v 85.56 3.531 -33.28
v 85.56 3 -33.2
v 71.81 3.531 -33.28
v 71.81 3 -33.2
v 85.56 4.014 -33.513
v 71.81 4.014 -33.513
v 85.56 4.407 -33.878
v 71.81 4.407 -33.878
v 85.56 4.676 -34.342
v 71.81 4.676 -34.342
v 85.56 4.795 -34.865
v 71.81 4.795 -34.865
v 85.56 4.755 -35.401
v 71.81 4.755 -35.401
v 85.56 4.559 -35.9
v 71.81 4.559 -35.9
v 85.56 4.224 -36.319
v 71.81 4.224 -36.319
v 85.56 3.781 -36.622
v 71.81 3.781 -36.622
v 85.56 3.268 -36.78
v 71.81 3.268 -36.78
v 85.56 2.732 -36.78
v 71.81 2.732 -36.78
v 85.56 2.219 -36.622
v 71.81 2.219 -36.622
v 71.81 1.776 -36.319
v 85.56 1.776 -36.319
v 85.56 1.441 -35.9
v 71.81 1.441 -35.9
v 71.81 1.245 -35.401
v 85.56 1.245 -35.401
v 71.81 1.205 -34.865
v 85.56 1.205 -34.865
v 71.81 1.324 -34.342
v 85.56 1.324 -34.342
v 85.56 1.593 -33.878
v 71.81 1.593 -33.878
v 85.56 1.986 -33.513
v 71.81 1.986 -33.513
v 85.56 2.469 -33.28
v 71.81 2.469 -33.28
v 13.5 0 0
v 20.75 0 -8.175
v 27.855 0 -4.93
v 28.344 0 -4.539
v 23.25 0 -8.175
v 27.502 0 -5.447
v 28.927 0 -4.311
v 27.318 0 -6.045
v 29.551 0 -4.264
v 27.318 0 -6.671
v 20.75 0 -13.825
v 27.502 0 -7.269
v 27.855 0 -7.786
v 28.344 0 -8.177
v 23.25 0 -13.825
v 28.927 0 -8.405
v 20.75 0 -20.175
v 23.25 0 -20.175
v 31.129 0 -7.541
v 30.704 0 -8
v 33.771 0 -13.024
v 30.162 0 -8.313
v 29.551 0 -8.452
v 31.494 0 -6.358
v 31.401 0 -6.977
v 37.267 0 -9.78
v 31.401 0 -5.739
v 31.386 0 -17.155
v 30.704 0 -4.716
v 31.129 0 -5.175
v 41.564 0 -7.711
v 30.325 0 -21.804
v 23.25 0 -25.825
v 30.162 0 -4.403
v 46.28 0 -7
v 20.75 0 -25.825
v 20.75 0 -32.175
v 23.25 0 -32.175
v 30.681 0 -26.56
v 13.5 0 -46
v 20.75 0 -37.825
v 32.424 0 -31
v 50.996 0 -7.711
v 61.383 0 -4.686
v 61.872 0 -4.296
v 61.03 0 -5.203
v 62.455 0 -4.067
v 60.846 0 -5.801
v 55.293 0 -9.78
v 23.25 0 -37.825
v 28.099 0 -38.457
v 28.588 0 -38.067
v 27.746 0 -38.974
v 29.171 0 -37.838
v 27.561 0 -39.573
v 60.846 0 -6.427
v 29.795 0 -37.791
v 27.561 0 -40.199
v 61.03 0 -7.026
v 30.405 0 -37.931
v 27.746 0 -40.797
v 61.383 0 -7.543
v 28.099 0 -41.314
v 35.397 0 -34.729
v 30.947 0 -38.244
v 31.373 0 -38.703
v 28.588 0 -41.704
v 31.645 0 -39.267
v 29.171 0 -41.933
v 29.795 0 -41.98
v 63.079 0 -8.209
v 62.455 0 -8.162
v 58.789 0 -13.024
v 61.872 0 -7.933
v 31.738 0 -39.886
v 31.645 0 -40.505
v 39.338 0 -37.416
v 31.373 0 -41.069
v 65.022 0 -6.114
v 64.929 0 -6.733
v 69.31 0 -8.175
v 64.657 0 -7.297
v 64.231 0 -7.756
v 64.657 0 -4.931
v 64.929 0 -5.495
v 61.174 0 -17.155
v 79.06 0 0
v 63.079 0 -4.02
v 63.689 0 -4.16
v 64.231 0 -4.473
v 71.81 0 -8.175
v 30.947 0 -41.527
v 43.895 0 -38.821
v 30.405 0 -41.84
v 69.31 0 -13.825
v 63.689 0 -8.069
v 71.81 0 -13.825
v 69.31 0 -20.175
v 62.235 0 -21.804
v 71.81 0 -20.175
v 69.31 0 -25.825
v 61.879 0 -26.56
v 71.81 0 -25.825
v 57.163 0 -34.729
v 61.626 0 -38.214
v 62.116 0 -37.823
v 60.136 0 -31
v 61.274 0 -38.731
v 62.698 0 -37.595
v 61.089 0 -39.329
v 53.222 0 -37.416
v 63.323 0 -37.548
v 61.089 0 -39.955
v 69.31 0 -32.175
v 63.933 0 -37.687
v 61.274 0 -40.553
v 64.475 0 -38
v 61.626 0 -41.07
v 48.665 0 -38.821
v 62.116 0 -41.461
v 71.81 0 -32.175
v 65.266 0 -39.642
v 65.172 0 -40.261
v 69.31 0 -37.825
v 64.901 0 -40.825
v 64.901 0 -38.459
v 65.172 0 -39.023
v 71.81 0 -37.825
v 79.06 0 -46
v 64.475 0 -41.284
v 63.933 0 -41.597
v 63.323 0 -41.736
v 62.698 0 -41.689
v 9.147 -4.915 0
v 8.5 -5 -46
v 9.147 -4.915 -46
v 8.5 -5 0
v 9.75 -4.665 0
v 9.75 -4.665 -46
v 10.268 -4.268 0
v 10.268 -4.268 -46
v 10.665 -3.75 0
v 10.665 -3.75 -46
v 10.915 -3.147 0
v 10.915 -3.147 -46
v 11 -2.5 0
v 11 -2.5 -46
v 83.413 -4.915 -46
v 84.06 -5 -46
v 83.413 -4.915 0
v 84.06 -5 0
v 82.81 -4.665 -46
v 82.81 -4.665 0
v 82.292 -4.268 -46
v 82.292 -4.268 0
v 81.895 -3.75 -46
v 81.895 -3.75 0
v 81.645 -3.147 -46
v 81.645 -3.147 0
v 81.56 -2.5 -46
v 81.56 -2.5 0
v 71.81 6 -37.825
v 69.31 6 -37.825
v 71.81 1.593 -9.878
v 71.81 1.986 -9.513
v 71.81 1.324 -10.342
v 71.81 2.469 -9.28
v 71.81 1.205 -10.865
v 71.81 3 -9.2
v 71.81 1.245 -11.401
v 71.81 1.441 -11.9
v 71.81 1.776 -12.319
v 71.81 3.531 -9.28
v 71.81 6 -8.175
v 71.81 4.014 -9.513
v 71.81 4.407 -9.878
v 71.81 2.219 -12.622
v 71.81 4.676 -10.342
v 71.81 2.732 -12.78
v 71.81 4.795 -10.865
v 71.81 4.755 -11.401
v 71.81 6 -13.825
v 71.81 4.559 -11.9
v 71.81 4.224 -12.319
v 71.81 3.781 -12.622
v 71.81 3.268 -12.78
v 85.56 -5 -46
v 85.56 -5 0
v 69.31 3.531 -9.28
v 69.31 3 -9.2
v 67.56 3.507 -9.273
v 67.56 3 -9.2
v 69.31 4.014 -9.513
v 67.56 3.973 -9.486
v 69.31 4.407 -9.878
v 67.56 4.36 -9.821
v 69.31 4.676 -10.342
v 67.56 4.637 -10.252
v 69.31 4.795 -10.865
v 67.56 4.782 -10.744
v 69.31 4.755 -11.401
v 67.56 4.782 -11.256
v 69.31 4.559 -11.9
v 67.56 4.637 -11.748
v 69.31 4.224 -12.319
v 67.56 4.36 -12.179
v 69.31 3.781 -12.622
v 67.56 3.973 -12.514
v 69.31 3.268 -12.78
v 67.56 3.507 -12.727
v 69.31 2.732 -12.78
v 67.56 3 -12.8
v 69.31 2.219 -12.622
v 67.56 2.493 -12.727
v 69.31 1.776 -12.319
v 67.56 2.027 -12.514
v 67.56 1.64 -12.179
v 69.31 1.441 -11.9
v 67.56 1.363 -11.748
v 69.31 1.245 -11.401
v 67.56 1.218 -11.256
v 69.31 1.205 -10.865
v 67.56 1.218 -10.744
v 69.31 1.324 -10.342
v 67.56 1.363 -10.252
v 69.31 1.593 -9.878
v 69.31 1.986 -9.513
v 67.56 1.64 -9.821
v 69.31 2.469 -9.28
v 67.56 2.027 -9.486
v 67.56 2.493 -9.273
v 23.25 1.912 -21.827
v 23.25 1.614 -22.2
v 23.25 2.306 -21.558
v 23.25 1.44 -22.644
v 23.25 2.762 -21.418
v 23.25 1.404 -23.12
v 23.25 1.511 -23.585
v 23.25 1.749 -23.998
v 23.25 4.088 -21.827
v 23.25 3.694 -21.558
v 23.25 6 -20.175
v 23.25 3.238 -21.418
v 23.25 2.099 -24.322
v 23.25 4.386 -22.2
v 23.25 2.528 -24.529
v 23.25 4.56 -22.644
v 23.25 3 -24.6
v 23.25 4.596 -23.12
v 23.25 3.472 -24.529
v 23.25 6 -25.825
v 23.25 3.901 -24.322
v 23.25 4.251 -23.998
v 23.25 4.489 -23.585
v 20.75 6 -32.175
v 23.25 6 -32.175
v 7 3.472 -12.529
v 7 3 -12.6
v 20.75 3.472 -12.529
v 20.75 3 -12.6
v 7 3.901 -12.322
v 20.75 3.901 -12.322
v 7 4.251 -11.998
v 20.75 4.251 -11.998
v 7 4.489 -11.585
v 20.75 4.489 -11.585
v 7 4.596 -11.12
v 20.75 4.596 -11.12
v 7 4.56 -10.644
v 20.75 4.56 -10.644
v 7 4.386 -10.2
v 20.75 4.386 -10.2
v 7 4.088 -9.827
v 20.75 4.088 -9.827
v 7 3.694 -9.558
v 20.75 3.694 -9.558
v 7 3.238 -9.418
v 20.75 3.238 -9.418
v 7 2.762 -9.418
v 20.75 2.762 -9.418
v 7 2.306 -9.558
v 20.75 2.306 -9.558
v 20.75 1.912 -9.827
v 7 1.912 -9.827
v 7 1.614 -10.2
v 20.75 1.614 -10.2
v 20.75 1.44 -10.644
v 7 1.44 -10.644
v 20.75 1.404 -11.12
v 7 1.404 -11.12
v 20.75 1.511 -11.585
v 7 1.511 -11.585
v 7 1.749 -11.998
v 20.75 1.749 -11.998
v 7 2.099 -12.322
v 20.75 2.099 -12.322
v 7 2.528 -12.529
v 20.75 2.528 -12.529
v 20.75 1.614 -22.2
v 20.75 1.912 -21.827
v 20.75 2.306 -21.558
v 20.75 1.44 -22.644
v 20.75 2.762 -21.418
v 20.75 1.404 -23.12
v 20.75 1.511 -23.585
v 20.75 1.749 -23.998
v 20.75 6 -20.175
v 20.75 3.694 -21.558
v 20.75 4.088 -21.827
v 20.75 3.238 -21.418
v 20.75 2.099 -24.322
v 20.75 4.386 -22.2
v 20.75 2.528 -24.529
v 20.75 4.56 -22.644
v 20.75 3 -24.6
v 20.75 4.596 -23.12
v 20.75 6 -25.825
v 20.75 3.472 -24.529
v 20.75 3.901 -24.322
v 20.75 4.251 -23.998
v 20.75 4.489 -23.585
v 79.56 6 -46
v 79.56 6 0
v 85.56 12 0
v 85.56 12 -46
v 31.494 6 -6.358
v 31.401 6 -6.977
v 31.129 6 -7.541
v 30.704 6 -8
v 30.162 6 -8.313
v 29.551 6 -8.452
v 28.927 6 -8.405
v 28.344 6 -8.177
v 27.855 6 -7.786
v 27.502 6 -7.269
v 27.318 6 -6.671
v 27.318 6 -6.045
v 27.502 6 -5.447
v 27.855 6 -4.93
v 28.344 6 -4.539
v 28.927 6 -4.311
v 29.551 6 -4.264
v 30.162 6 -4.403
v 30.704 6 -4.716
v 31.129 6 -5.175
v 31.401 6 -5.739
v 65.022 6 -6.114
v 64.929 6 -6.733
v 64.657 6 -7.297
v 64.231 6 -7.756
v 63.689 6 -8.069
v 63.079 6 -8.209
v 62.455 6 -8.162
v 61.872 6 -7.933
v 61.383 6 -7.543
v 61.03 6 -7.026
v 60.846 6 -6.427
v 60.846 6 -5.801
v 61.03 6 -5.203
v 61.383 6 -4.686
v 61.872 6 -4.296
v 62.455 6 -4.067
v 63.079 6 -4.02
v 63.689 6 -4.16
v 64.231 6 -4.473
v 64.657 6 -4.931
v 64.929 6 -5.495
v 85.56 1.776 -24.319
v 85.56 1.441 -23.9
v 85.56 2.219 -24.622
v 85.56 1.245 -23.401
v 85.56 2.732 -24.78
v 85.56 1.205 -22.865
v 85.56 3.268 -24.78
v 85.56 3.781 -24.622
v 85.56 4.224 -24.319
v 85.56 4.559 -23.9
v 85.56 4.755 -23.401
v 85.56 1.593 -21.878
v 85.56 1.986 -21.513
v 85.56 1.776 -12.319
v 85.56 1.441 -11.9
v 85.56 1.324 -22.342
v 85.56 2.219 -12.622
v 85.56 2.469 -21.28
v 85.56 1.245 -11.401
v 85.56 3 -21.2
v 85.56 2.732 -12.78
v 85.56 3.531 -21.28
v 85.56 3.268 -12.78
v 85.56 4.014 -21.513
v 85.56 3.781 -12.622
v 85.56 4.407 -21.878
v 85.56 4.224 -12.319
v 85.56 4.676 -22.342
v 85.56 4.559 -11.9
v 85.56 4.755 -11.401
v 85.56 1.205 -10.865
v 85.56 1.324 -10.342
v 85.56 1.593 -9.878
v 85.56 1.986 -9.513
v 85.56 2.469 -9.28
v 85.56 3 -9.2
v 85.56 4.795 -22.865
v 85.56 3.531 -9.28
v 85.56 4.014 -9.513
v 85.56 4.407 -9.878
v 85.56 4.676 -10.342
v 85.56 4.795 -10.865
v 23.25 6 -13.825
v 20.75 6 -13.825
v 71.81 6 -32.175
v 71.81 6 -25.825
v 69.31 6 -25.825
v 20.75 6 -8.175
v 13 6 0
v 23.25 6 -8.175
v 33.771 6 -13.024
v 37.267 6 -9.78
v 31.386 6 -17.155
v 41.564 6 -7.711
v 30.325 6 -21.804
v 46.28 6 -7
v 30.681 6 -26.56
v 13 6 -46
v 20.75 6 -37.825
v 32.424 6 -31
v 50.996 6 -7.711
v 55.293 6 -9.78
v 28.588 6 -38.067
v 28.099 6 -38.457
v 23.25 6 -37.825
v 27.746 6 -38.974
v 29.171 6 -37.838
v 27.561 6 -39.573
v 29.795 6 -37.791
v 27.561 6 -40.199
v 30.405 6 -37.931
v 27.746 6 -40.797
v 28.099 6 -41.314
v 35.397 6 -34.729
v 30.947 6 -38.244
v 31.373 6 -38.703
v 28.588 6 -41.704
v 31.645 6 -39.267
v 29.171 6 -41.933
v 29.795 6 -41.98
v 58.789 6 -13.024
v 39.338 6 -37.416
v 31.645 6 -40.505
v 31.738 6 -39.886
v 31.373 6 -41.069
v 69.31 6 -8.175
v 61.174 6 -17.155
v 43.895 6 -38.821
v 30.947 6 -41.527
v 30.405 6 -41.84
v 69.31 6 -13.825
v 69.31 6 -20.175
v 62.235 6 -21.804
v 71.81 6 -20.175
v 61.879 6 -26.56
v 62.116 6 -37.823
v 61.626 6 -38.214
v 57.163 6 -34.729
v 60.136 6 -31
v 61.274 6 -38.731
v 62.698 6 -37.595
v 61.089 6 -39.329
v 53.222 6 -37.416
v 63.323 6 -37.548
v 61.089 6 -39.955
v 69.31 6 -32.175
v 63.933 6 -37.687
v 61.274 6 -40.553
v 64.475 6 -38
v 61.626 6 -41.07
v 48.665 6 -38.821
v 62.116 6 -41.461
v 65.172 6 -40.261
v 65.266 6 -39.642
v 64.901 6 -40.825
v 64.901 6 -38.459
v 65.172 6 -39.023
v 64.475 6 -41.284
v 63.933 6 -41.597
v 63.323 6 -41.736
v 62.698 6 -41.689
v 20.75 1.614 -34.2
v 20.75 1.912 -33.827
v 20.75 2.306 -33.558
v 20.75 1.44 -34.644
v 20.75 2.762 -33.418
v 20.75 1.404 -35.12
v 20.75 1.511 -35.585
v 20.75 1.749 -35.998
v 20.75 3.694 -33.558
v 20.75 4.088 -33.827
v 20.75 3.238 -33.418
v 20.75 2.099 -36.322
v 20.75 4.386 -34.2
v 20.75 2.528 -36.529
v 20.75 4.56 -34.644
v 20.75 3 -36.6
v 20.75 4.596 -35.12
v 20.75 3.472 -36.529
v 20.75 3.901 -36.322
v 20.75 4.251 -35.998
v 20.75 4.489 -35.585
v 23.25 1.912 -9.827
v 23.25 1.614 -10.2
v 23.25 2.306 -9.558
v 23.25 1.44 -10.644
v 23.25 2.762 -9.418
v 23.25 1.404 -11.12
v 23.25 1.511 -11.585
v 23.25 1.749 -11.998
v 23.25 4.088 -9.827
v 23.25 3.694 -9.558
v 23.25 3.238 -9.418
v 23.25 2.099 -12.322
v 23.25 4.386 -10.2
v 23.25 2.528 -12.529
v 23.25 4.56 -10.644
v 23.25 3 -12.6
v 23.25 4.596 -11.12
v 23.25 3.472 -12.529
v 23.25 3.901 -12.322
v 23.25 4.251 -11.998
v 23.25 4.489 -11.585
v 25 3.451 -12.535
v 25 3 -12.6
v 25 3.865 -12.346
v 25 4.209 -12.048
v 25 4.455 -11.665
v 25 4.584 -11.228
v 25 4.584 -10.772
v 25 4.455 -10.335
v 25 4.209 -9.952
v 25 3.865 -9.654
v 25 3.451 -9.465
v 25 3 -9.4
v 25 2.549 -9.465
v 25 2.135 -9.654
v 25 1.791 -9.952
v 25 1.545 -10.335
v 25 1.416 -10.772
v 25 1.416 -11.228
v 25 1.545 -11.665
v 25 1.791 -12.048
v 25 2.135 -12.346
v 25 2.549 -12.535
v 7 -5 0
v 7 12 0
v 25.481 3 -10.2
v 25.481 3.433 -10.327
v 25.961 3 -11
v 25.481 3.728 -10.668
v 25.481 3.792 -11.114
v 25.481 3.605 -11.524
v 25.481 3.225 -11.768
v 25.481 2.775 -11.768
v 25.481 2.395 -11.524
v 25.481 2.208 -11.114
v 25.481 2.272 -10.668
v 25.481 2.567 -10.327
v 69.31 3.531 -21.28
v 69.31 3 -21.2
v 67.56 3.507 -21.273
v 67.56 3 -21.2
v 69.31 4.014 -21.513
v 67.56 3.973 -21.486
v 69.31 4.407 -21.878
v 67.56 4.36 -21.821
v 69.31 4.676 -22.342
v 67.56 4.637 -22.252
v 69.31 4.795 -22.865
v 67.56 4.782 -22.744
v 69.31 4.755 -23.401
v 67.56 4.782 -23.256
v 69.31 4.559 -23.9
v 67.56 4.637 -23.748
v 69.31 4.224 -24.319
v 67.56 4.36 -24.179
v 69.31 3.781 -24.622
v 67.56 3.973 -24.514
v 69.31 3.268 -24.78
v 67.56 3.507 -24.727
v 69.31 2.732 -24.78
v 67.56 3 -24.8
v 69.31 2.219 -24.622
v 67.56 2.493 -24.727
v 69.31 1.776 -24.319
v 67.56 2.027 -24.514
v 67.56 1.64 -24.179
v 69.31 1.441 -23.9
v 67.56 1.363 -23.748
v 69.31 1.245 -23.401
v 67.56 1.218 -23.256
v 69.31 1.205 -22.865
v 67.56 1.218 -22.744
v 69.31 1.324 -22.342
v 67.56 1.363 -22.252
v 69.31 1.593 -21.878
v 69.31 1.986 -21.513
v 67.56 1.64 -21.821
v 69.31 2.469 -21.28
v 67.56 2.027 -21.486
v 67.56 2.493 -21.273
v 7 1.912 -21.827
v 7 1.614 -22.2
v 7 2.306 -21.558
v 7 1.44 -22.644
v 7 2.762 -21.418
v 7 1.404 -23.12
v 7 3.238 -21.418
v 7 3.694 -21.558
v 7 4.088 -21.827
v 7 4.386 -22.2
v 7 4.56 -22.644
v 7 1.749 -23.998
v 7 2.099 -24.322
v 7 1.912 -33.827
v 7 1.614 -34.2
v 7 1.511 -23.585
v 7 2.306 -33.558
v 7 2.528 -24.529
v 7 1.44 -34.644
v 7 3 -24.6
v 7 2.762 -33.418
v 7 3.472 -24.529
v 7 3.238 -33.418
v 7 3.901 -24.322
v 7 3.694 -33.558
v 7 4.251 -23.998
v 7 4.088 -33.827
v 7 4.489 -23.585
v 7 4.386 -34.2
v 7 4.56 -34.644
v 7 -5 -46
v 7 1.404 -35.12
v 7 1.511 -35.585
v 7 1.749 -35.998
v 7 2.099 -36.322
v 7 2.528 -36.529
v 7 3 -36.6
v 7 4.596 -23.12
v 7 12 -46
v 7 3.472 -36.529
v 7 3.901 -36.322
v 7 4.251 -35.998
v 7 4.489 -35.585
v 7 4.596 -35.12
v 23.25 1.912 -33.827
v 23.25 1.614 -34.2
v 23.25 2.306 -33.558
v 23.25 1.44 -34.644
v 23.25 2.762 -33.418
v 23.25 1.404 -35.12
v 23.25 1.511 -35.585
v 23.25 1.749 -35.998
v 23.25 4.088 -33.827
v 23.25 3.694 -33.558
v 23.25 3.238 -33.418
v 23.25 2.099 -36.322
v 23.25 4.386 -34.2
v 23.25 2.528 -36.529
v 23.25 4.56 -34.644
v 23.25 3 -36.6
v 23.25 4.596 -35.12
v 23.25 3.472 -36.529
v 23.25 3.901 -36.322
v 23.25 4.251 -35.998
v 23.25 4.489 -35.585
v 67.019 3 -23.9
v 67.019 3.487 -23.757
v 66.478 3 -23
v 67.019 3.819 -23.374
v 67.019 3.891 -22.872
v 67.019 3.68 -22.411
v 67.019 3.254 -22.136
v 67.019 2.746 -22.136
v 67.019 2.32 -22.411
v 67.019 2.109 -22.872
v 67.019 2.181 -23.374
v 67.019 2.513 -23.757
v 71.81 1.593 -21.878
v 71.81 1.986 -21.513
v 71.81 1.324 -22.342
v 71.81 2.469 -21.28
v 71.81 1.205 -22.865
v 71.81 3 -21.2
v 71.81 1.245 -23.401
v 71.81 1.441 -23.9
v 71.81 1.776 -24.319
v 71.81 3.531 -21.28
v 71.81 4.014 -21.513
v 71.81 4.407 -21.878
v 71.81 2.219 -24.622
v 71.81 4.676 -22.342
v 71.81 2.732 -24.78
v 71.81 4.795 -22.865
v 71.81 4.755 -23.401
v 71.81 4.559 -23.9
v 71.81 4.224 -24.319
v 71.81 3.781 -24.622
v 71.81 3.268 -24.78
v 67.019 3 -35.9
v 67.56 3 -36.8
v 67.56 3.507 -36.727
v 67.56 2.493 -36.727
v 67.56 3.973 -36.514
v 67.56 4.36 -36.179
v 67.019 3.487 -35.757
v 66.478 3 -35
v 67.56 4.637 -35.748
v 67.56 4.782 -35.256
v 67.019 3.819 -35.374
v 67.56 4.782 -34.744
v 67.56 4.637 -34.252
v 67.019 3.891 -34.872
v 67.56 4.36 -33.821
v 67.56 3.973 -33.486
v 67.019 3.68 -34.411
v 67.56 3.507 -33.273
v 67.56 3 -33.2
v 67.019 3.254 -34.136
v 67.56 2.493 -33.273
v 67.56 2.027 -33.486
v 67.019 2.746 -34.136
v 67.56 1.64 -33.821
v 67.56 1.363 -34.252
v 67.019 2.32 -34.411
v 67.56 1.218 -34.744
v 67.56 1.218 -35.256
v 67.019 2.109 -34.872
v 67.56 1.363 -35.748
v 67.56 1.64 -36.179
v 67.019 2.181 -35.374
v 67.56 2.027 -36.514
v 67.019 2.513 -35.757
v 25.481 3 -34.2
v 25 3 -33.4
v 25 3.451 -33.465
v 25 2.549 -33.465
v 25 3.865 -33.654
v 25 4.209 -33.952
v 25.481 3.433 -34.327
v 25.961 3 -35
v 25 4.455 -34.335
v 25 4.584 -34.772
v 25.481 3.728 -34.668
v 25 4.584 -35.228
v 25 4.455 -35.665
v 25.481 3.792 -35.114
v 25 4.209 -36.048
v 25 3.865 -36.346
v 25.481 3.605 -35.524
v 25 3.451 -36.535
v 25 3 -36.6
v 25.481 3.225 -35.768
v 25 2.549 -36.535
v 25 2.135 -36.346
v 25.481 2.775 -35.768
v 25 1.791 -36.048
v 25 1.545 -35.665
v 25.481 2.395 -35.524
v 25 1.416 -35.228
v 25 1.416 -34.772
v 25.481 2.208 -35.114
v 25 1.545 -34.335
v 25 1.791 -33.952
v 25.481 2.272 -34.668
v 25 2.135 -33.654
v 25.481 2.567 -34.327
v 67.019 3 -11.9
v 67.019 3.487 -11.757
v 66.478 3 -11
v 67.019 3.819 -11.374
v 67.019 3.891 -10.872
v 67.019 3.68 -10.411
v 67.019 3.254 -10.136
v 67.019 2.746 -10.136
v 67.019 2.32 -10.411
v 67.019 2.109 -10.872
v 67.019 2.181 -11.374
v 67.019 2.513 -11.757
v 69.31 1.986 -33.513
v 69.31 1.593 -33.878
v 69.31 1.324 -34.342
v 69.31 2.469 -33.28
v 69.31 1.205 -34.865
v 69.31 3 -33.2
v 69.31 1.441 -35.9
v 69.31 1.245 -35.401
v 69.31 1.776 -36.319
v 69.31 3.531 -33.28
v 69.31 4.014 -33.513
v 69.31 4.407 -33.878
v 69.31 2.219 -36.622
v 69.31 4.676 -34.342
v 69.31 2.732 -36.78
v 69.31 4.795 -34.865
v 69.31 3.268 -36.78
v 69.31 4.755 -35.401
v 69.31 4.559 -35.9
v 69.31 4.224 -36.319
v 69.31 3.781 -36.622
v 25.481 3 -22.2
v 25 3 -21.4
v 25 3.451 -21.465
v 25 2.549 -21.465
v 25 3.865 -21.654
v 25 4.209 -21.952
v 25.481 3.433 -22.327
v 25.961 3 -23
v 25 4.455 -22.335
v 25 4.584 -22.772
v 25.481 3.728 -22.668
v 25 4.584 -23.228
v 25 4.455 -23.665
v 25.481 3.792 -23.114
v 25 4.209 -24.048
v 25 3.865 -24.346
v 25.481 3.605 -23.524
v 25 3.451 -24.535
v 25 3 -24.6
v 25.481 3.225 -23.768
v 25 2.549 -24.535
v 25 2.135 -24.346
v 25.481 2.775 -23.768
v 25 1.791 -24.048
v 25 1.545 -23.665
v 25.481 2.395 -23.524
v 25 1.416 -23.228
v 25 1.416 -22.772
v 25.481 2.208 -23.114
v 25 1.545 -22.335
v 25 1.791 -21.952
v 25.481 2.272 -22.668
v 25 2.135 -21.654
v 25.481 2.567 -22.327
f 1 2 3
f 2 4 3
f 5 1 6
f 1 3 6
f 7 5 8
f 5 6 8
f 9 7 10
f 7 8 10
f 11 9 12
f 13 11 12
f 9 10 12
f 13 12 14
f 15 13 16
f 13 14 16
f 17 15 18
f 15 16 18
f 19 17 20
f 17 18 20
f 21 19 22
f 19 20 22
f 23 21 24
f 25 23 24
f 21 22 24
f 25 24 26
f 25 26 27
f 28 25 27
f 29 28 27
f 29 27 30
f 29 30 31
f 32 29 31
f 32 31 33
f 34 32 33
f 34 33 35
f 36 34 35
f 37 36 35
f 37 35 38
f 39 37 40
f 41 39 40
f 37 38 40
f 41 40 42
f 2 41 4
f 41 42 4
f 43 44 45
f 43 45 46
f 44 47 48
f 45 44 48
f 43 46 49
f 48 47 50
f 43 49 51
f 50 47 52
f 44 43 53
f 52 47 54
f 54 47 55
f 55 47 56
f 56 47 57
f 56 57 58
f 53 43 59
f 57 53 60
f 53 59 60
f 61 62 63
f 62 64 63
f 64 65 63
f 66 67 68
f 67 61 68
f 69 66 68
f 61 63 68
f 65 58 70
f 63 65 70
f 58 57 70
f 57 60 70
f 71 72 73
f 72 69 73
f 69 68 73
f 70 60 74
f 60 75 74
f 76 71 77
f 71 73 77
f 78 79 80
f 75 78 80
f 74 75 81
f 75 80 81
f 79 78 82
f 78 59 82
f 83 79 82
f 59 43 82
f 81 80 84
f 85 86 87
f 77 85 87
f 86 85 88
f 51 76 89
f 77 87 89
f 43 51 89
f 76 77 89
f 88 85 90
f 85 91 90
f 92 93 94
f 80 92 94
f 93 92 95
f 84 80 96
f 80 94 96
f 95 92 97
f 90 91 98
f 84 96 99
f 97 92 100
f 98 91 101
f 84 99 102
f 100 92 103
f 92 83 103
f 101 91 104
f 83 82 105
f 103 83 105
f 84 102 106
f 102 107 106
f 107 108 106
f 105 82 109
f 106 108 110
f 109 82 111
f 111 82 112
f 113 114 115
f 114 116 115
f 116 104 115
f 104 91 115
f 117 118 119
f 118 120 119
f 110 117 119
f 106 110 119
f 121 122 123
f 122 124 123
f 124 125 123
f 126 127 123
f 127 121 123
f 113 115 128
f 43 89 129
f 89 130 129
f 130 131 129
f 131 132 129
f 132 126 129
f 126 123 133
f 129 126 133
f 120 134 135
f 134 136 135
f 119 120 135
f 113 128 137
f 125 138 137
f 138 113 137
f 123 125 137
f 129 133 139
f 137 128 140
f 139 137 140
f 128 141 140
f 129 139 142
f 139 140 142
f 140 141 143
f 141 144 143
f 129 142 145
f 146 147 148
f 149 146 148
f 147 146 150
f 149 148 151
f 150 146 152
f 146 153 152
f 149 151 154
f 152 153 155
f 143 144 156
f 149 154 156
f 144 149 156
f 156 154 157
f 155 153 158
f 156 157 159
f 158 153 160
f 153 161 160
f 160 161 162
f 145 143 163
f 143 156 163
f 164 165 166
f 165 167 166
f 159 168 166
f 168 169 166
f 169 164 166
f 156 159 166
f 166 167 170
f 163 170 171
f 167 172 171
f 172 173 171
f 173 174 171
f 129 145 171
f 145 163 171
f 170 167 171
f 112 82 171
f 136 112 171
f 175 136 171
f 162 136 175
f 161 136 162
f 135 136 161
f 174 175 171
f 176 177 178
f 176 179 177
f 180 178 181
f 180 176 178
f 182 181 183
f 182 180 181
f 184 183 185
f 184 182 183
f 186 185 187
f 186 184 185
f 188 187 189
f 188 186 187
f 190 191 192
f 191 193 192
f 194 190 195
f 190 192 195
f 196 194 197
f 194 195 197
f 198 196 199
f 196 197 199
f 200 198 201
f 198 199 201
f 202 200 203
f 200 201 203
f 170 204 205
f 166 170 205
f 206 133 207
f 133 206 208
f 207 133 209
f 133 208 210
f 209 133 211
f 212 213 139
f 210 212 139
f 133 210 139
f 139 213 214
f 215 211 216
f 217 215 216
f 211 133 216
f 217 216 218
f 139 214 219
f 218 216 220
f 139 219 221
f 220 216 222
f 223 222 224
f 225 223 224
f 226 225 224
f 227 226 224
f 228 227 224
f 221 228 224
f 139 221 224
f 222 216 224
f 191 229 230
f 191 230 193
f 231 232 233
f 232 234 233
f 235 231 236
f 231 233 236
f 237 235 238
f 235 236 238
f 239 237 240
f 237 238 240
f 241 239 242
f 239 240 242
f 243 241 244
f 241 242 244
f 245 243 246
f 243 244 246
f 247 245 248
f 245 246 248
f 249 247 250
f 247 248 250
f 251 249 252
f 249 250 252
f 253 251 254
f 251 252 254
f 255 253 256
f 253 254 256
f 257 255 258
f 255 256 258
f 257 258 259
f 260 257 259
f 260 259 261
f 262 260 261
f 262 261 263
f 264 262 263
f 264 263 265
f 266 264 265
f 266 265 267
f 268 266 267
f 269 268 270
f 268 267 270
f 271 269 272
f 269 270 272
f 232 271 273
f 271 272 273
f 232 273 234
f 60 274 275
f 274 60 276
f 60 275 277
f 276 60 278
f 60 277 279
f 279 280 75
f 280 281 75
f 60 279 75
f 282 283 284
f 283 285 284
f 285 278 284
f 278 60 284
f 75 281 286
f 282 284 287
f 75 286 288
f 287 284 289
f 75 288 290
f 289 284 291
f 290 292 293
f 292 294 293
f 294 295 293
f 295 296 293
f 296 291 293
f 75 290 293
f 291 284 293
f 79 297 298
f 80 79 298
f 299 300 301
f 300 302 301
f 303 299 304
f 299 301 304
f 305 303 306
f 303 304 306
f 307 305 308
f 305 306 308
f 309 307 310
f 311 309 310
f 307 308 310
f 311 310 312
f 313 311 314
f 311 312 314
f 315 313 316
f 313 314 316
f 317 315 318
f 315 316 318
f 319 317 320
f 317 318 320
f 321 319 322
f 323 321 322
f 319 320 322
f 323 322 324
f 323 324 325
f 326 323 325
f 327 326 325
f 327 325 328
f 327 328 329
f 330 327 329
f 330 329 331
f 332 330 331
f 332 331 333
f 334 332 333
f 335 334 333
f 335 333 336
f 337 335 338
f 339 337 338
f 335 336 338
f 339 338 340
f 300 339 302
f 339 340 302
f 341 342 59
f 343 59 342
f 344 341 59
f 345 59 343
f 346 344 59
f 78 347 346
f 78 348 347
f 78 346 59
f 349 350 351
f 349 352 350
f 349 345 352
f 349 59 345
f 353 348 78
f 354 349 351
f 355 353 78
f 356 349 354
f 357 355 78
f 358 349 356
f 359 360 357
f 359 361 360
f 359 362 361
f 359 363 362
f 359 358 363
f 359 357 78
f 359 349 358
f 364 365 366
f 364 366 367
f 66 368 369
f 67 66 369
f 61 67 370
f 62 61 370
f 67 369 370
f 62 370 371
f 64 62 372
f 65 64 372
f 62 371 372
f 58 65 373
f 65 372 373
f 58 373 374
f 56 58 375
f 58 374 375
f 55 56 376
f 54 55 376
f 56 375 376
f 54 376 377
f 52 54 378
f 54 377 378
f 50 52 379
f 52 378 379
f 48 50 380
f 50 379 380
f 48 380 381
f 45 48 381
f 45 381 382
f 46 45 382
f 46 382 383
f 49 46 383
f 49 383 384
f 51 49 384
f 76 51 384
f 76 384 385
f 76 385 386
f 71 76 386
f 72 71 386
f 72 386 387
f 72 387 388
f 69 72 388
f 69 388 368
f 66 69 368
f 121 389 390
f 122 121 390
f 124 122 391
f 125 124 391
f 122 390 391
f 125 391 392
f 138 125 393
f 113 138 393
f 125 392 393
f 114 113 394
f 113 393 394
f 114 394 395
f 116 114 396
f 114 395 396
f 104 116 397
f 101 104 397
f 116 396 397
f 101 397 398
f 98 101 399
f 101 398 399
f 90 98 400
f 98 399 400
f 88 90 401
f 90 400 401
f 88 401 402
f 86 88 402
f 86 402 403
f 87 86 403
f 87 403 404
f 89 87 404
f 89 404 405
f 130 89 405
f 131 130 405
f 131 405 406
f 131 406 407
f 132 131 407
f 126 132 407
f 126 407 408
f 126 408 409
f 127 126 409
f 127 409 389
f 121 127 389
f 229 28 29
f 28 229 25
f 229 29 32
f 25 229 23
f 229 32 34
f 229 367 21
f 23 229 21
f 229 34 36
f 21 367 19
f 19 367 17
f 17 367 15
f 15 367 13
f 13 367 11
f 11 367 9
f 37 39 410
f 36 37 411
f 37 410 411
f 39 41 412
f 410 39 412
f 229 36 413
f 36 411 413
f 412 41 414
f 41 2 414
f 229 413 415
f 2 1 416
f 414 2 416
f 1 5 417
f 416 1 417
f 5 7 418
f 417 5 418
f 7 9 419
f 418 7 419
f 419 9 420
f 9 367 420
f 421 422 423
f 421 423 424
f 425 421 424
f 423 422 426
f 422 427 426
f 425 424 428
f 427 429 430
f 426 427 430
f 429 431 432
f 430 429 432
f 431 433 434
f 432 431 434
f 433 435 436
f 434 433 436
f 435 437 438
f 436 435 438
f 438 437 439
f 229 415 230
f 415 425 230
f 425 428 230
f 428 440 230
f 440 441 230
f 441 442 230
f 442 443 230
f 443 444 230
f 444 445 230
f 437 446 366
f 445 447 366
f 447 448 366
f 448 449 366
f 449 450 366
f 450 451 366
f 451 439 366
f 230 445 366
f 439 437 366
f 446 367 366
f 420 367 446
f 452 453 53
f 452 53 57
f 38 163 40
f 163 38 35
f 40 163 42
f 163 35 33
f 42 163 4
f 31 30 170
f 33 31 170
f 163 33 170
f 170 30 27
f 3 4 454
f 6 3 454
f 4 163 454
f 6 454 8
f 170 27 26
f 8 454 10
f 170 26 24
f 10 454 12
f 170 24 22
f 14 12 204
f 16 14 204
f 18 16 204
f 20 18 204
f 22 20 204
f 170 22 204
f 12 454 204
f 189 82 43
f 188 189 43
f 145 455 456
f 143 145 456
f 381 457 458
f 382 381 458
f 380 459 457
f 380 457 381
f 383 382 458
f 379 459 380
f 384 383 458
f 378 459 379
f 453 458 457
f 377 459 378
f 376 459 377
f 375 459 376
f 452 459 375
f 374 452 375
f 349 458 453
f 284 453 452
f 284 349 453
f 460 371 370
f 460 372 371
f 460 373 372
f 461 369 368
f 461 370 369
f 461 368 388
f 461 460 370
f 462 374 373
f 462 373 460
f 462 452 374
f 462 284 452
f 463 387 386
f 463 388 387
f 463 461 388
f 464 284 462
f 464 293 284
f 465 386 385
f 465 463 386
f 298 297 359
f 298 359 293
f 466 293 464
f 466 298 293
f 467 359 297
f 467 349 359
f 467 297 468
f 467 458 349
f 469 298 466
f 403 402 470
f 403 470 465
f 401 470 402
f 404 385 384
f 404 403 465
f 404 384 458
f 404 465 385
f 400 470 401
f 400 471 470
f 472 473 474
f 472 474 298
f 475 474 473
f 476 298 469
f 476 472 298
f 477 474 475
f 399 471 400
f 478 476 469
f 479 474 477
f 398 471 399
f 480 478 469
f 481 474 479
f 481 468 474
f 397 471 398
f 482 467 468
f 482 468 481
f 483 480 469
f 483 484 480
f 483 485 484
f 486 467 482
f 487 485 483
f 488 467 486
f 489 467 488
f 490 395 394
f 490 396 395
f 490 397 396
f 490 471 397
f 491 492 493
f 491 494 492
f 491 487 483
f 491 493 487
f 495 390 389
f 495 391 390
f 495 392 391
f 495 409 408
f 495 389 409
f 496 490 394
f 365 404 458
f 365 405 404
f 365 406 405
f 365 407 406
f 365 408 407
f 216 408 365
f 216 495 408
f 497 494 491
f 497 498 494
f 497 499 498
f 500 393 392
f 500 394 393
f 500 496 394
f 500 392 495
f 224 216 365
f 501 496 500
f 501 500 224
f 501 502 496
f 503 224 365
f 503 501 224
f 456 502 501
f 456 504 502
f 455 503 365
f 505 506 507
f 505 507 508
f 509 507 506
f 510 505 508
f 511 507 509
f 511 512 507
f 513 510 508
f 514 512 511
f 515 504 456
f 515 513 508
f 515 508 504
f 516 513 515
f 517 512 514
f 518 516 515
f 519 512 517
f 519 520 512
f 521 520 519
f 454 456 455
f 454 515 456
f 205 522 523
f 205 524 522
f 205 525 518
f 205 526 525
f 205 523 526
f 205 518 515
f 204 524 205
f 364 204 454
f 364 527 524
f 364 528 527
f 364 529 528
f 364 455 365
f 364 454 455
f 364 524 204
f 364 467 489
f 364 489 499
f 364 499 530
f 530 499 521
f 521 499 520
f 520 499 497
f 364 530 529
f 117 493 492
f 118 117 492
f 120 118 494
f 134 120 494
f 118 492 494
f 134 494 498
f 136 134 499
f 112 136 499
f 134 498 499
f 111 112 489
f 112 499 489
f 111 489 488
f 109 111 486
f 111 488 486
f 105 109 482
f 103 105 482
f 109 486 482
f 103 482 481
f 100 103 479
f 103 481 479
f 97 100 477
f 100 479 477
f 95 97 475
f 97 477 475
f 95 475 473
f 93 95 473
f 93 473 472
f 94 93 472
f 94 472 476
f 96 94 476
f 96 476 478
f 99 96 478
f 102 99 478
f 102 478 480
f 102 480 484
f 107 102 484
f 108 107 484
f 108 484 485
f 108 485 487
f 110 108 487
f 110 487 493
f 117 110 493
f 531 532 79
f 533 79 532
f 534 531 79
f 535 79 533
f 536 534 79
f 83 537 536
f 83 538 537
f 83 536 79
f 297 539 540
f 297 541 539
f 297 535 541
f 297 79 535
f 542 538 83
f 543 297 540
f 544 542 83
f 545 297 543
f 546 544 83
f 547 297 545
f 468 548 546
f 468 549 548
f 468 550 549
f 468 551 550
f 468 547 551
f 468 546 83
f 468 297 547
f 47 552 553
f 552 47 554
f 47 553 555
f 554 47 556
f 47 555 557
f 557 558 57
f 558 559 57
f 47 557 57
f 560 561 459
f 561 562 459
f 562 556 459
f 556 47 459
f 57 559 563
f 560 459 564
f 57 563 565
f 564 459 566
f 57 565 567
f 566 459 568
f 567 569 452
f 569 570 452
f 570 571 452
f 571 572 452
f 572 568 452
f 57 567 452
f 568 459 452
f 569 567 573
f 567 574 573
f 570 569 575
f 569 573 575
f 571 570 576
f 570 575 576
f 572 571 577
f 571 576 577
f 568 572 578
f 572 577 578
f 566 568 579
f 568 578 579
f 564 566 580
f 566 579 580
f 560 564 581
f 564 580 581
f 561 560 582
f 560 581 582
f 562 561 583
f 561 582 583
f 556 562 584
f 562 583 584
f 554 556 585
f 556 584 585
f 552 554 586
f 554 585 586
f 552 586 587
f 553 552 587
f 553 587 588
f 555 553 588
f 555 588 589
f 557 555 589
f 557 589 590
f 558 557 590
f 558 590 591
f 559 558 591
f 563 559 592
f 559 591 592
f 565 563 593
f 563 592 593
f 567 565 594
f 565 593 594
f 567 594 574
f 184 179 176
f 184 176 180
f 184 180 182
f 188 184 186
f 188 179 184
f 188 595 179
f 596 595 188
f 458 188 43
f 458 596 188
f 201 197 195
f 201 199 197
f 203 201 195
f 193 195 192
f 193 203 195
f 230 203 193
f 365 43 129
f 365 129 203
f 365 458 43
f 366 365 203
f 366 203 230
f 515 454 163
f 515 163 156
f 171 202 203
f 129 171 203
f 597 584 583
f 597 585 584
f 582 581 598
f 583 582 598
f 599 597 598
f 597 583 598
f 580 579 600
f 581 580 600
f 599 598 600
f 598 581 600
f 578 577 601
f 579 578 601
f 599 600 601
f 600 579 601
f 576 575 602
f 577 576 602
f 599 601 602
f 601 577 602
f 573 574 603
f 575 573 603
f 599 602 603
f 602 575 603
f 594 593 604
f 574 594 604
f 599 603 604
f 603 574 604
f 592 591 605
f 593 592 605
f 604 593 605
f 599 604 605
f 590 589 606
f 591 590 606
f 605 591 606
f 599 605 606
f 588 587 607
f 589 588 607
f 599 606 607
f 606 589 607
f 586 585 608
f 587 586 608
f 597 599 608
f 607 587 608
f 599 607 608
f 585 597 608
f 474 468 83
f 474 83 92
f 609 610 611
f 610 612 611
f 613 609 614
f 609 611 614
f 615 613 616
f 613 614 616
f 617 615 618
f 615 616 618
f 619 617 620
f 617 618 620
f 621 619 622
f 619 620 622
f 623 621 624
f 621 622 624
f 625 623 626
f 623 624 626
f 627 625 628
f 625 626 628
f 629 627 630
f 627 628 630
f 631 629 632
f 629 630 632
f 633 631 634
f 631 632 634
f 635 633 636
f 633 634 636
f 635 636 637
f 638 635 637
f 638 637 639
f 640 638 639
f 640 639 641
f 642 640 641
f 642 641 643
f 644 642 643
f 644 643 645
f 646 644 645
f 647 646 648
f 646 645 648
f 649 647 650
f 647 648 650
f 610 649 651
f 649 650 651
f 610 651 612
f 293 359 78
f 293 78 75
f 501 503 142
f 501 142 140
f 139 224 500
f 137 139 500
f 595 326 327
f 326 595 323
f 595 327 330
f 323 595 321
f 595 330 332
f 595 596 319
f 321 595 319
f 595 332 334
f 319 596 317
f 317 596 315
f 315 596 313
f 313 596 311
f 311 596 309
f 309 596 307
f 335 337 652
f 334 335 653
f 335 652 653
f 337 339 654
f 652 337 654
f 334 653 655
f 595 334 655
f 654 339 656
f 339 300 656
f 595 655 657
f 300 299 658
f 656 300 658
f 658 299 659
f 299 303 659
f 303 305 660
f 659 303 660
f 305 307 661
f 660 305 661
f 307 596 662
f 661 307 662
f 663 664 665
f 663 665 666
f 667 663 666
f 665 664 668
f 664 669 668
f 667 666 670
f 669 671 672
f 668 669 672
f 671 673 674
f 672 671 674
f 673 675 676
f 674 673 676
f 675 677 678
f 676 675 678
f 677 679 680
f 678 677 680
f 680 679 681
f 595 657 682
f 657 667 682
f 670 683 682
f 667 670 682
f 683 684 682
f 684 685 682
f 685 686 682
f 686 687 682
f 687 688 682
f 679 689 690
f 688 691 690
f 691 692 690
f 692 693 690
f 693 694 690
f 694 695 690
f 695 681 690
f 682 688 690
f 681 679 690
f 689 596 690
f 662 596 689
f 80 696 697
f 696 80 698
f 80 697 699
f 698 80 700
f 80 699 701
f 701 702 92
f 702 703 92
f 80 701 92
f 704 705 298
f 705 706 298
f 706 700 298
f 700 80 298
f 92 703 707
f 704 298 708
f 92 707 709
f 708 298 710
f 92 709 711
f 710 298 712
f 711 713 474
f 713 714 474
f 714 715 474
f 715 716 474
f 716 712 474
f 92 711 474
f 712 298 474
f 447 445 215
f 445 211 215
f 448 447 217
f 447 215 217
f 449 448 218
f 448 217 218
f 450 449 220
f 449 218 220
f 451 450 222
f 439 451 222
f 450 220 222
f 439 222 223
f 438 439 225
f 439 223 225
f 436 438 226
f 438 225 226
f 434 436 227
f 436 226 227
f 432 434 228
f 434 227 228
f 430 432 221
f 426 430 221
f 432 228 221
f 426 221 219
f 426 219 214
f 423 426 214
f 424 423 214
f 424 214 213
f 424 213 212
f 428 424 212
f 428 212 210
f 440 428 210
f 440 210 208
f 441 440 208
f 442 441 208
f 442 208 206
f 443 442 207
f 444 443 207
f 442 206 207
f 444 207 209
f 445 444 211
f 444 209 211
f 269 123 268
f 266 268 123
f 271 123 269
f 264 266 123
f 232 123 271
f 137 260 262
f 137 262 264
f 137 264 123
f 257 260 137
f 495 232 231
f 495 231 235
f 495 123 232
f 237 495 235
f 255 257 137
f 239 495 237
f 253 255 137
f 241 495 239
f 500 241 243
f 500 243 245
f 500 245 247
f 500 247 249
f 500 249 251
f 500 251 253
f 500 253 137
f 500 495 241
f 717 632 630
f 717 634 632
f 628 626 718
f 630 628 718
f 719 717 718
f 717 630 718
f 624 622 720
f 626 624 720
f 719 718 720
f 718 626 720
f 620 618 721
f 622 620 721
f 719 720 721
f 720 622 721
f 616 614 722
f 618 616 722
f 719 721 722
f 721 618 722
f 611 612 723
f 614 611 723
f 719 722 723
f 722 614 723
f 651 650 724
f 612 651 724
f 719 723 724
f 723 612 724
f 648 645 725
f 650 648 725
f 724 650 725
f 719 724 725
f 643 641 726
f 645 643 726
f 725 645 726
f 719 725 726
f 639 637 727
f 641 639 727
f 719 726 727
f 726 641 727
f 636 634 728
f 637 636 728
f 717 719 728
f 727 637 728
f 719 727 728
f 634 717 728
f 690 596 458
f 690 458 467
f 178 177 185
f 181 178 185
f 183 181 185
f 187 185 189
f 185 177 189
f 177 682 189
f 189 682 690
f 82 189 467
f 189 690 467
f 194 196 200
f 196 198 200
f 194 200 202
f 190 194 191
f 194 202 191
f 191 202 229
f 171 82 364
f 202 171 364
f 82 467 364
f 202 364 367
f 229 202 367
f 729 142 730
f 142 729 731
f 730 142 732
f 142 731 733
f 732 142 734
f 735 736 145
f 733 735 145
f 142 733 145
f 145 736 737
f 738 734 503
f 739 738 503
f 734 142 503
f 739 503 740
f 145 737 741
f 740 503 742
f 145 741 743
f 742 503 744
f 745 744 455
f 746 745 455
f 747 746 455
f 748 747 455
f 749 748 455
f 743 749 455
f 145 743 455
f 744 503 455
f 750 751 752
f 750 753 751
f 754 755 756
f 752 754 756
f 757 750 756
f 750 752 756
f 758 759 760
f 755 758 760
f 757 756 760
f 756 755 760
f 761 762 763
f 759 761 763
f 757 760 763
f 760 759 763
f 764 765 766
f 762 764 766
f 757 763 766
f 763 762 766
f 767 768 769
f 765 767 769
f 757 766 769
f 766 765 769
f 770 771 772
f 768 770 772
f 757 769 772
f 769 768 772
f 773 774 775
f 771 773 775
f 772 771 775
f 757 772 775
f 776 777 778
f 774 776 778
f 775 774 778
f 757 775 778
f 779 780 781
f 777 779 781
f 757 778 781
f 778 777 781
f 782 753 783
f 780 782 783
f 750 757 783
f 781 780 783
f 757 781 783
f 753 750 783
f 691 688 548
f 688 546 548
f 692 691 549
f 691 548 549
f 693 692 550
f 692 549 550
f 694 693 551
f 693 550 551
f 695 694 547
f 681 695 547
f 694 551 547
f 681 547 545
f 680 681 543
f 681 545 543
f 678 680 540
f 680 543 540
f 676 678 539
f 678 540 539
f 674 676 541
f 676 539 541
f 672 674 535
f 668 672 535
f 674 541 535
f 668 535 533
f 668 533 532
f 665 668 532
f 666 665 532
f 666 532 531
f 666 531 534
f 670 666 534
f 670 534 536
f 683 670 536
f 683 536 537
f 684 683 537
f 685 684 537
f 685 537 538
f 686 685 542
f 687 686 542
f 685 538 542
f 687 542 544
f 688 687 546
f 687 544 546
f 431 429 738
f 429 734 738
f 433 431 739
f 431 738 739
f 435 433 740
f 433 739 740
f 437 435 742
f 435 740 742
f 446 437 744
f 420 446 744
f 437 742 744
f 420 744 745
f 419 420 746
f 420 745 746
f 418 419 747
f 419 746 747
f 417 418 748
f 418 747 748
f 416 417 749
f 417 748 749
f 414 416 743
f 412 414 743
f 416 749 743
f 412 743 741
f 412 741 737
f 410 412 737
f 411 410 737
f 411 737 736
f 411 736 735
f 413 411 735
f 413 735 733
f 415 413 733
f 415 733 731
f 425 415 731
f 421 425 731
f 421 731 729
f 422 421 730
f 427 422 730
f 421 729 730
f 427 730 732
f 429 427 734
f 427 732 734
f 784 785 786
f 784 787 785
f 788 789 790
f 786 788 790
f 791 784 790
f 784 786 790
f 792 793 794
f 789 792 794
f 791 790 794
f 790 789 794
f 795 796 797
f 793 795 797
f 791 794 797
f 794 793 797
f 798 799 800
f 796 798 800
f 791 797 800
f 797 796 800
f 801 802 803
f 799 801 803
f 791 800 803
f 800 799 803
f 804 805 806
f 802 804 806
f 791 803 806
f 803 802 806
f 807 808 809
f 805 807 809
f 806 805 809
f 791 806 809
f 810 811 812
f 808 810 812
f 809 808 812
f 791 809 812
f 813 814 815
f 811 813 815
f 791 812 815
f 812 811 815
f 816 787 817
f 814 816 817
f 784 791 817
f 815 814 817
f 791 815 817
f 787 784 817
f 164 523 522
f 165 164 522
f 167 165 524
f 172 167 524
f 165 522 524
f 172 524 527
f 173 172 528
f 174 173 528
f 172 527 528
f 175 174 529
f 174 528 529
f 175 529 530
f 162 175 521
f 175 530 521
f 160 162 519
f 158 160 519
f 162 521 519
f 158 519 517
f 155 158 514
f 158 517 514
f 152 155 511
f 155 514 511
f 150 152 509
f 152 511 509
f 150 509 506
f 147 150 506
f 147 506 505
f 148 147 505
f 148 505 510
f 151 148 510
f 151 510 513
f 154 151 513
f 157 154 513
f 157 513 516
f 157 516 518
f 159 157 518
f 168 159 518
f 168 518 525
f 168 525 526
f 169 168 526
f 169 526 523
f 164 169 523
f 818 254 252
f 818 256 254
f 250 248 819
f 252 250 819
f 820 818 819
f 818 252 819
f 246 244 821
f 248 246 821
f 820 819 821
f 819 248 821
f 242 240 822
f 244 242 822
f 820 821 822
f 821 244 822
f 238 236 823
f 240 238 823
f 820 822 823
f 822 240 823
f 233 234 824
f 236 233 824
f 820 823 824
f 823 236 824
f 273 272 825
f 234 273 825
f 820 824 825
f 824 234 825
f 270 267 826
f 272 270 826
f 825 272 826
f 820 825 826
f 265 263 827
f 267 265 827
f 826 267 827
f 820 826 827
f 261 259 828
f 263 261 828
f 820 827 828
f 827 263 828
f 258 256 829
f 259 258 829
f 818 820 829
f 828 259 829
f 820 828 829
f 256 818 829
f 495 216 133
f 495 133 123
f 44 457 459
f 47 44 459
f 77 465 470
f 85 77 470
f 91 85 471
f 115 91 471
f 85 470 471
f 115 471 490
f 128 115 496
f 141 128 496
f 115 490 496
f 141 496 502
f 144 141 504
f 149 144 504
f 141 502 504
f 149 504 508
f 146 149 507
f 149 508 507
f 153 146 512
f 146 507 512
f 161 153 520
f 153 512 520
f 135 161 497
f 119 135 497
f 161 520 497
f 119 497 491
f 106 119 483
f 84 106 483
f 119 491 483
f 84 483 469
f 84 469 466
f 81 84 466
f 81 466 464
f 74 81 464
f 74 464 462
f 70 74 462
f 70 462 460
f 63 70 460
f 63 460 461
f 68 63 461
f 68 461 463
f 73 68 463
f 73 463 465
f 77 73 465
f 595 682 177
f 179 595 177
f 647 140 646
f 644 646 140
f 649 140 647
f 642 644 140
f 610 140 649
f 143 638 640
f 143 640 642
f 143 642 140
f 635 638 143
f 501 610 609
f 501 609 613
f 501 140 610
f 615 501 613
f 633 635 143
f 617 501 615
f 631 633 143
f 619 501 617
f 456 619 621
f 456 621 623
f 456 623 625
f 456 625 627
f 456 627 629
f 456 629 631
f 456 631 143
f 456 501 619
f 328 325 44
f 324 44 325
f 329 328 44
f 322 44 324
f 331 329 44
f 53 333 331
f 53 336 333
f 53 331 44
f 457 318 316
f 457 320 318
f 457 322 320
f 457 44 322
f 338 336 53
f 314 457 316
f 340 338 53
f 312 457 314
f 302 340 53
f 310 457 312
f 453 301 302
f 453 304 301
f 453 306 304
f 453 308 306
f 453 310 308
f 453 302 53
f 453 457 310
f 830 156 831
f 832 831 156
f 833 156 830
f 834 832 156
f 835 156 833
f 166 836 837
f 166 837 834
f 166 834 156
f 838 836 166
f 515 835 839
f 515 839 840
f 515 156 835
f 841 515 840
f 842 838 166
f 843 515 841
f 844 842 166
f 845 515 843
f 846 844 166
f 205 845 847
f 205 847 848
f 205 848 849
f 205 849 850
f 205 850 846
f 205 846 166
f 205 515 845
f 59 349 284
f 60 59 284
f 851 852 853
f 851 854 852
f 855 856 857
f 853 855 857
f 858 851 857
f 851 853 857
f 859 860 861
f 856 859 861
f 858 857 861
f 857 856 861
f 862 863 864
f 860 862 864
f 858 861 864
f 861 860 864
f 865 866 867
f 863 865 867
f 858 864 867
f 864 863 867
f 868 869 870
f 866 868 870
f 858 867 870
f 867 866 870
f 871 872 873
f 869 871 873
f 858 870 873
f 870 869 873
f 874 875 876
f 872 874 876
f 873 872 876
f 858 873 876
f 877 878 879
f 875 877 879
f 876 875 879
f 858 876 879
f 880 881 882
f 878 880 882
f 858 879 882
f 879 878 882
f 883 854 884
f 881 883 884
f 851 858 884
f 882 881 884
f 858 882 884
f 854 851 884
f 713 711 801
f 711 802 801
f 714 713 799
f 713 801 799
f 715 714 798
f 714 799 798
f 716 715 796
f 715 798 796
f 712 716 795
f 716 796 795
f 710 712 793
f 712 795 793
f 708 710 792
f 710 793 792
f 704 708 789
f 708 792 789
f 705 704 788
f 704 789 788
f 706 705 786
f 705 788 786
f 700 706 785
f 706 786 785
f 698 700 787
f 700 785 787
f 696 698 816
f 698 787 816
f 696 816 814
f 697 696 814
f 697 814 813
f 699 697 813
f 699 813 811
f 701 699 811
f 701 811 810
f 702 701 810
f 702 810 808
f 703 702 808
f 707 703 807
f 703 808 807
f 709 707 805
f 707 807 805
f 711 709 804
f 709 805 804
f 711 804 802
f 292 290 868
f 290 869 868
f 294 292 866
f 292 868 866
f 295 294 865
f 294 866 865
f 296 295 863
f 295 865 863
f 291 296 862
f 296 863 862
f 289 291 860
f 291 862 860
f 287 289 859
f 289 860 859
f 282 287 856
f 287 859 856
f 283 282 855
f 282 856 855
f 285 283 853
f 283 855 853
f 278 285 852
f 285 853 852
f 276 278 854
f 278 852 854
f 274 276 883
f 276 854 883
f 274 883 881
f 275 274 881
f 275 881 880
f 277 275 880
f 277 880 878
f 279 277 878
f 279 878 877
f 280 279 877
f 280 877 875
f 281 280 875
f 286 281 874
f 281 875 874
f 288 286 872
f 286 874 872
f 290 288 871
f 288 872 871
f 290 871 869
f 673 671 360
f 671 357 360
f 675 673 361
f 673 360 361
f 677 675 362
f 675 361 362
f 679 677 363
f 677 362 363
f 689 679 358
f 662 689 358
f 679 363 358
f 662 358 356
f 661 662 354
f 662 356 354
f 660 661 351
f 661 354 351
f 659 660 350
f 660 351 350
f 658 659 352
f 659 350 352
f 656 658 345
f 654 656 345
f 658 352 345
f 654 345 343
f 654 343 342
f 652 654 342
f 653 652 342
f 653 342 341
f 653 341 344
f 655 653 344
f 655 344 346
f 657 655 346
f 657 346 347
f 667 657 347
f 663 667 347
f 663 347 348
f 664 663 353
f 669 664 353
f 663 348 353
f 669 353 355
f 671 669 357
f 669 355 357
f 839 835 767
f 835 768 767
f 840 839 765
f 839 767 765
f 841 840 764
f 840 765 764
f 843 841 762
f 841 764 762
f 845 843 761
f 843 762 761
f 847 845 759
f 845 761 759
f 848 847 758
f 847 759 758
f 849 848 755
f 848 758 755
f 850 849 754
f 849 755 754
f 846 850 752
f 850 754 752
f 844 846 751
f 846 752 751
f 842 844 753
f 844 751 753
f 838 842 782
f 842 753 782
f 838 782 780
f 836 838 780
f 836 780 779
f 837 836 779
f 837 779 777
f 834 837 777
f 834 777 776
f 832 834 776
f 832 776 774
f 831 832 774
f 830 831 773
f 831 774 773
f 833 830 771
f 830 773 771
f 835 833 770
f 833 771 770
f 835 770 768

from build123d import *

# Parameters (mm, degrees)
SKETCH1_W                                           = 92.56
SKETCH1_H                                           = 46
BOSS_EXTRUDE1_DEPTH                                 = 6
SKETCH2_W                                           = 7
SKETCH2_H                                           = 46
BOSS_EXTRUDE2_DEPTH                                 = 54
SKETCH3_R                                           = 16
CUT_EXTRUDE1_DEPTH                                  = 120.512985069
SKETCH4_R                                           = 16
CUT_EXTRUDE2_DEPTH                                  = 117.616266447
F_4_2_4_2_DIAMETER_HOLE1_D                          = 4.2
F_4_2_4_2_DIAMETER_HOLE2_D                          = 4.2
CHAMFER1_SIZE                                       = 3.5
CHAMFER2_SIZE                                       = 6
BOSS_EXTRUDE3_DEPTH                                 = 46
FILLET1_R                                           = 2.5
CHAMFER3_SIZE                                       = 2.5
FILLET2_R                                           = 2.5
CSK_FOR_M3_COUNTERSUNK_FLAT_HEAD_SCREW1_D           = 3.2
CSK_FOR_M3_COUNTERSUNK_FLAT_HEAD_SCREW1_DEPTH       = 30
CSK_FOR_M3_COUNTERSUNK_FLAT_HEAD_SCREW1_CSINK_D     = 6.3
CSK_FOR_M3_COUNTERSUNK_FLAT_HEAD_SCREW1_CSINK_ANGLE = 90
CSK_FOR_M3_COUNTERSUNK_FLAT_HEAD_SCREW1_TIP         = 0.96137699
CSK_FOR_M3_COUNTERSUNK_FLAT_HEAD_SCREW2_D           = 3.6
CSK_FOR_M3_COUNTERSUNK_FLAT_HEAD_SCREW2_DEPTH       = 30
CSK_FOR_M3_COUNTERSUNK_FLAT_HEAD_SCREW2_CSINK_D     = 6.3
CSK_FOR_M3_COUNTERSUNK_FLAT_HEAD_SCREW2_CSINK_ANGLE = 90
CSK_FOR_M3_COUNTERSUNK_FLAT_HEAD_SCREW2_TIP         = 1.081549114
SKETCH18_W                                          = 2.5
SKETCH18_H                                          = 5.65
CUT_EXTRUDE4_DEPTH                                  = 121.623188484


with BuildPart() as part:
    # Sketch1 → Boss-Extrude1 (new body)
    with BuildSketch(Plane(origin=(0, 0, 0), x_dir=(1, 0, 0), z_dir=(0, 1, 0))):
        with Locations((46.28, 23)):
            Rectangle(SKETCH1_W, SKETCH1_H)
    extrude(amount=BOSS_EXTRUDE1_DEPTH)

    # Sketch2 → Boss-Extrude2 (add)
    with BuildSketch(Plane(origin=(0, 6, 0), x_dir=(1, 0, 0), z_dir=(0, 1, 0))):
        with Locations((89.06, 23)):
            Rectangle(SKETCH2_W, SKETCH2_H)
        with Locations((3.5, 23)):
            Rectangle(SKETCH2_W, SKETCH2_H)
    extrude(amount=BOSS_EXTRUDE2_DEPTH)

    # Sketch3 → Cut-Extrude1 (cut, through all)
    with BuildSketch(Plane(origin=(92.56, 0, 0), x_dir=(0, 0, -1), z_dir=(1, 0, 0))):
        with Locations((23, 37)):
            Circle(SKETCH3_R)
    extrude(amount=-CUT_EXTRUDE1_DEPTH, mode=Mode.SUBTRACT)

    # Sketch4 → Cut-Extrude2 (cut, through all)
    with BuildSketch(Plane(origin=(0, 6, 0), x_dir=(1, 0, 0), z_dir=(0, 1, 0))):
        with Locations(Location((46.28, 23, 0), (0, 0, 270))):
            Circle(SKETCH4_R)
    extrude(amount=-CUT_EXTRUDE2_DEPTH, mode=Mode.SUBTRACT)

    # Ø4.2 (4.2) Diameter Hole1 (through all)
    with Locations(Plane(origin=(0, 0, 0), x_dir=(-1, 0, 0), z_dir=(0, -1, 0))):
        with Locations((-63.165621688, 39.642079068), (-29.637920932, 39.885621688), (-29.394378312, 6.357920932), (-62.922079068, 6.114378312)):
            Hole(F_4_2_4_2_DIAMETER_HOLE1_D / 2)

    # Ø4.2 (4.2) Diameter Hole2 (through all)
    with Locations(Plane.ZY):
        with Locations((-39.885621688, 53.642079068), (-6.357920932, 53.885621688), (-6.114378312, 20.357920932), (-39.642079068, 20.114378312)):
            Hole(F_4_2_4_2_DIAMETER_HOLE2_D / 2)

    # Chamfer1
    chamfer1_edges = [part.edges().sort_by_distance(p)[0] for p in [
        (89.06, 60, -46),
        (89.06, 60, 0),
        (3.5, 60, 0),
        (3.5, 60, -46),
    ]]
    chamfer(chamfer1_edges, length=CHAMFER1_SIZE)

    # Chamfer2
    chamfer2_edges = [part.edges().sort_by_distance(p)[0] for p in [
        (85.56, 6, -23),
        (7, 6, -23),
    ]]
    chamfer(chamfer2_edges, length=CHAMFER2_SIZE)

    # Sketch10 → Boss-Extrude3 (add)
    with BuildSketch(Plane(origin=(0, 0, -46), x_dir=(-1, 0, 0), z_dir=(0, 0, -1))):
        Polygon((0, 11), (5, 11), (5, -5), (-11, -5), (-11, 0), (0, 0), align=None)
        Polygon((-81.56, 0), (-92.56, 0), (-92.56, 11), (-97.56, 11), (-97.56, -5), (-81.56, -5), align=None)
    extrude(amount=-BOSS_EXTRUDE3_DEPTH)

    # Fillet1
    fillet1_edges = [part.edges().sort_by_distance(p)[0] for p in [
        (-5, 11, -23),
        (11, -5, -23),
        (81.56, -5, -23),
        (97.56, 11, -23),
    ]]
    fillet(fillet1_edges, radius=FILLET1_R)

    # Chamfer3
    chamfer3_edges = [part.edges().sort_by_distance(p)[0] for p in [
        (92.56, 11, -23),
        (81.56, 0, -23),
        (11, 0, -23),
        (0, 11, -23),
    ]]
    chamfer(chamfer3_edges, length=CHAMFER3_SIZE - 0.0001)  # a hair under: the kernel refuses the full size

    # Fillet2
    fillet2_edges = [part.edges().sort_by_distance(p)[0] for p in [
        (-5, -5, -23),
        (97.56, -5, -23),
    ]]
    fillet(fillet2_edges, radius=FILLET2_R)

    # CSK for M3 Countersunk Flat Head Screw1
    with Locations(Plane.ZY.offset(5)):
        with Locations((-11, 3), (-23, 3), (-35, 3)):
            CounterSinkHole(CSK_FOR_M3_COUNTERSUNK_FLAT_HEAD_SCREW1_D / 2, CSK_FOR_M3_COUNTERSUNK_FLAT_HEAD_SCREW1_CSINK_D / 2, depth=CSK_FOR_M3_COUNTERSUNK_FLAT_HEAD_SCREW1_DEPTH, counter_sink_angle=CSK_FOR_M3_COUNTERSUNK_FLAT_HEAD_SCREW1_CSINK_ANGLE)
            with Locations((0, 0, -(CSK_FOR_M3_COUNTERSUNK_FLAT_HEAD_SCREW1_DEPTH + CSK_FOR_M3_COUNTERSUNK_FLAT_HEAD_SCREW1_TIP / 2))):  # 118° drill point
                Cone(0, CSK_FOR_M3_COUNTERSUNK_FLAT_HEAD_SCREW1_D / 2, CSK_FOR_M3_COUNTERSUNK_FLAT_HEAD_SCREW1_TIP, mode=Mode.SUBTRACT)

    # CSK for M3 Countersunk Flat Head Screw2
    with Locations(Plane(origin=(97.56, 0, 0), x_dir=(0, 0, -1), z_dir=(1, 0, 0))):
        with Locations((11, 3), (23, 3), (35, 3)):
            CounterSinkHole(CSK_FOR_M3_COUNTERSUNK_FLAT_HEAD_SCREW2_D / 2, CSK_FOR_M3_COUNTERSUNK_FLAT_HEAD_SCREW2_CSINK_D / 2, depth=CSK_FOR_M3_COUNTERSUNK_FLAT_HEAD_SCREW2_DEPTH, counter_sink_angle=CSK_FOR_M3_COUNTERSUNK_FLAT_HEAD_SCREW2_CSINK_ANGLE)
            with Locations((0, 0, -(CSK_FOR_M3_COUNTERSUNK_FLAT_HEAD_SCREW2_DEPTH + CSK_FOR_M3_COUNTERSUNK_FLAT_HEAD_SCREW2_TIP / 2))):  # 118° drill point
                Cone(0, CSK_FOR_M3_COUNTERSUNK_FLAT_HEAD_SCREW2_D / 2, CSK_FOR_M3_COUNTERSUNK_FLAT_HEAD_SCREW2_TIP, mode=Mode.SUBTRACT)

    # Sketch18 → Cut-Extrude4 (cut, through all)
    with BuildSketch(Plane(origin=(0, 6, 0), x_dir=(1, 0, 0), z_dir=(0, 1, 0))):
        with Locations((22, 23)):
            Rectangle(SKETCH18_W, SKETCH18_H)
        with Locations((22, 35)):
            Rectangle(SKETCH18_W, SKETCH18_H)
        with Locations((22, 11)):
            Rectangle(SKETCH18_W, SKETCH18_H)
    cut_extrude4 = extrude(amount=-CUT_EXTRUDE4_DEPTH, mode=Mode.SUBTRACT)

    # Mirror1: Cut-Extrude4 across plane
    add(cut_extrude4.mirror(Plane.ZY.offset(-46.28)), mode=Mode.SUBTRACT)

    # SurfaceCut1
    split(bisect_by=Plane(origin=(7, 0, 0), x_dir=(0, 0, -1), z_dir=(1, 0, 0)), keep=Keep.TOP)

    # SurfaceCut2
    split(bisect_by=Plane.ZY.offset(-85.56), keep=Keep.TOP)


solid = part.part
